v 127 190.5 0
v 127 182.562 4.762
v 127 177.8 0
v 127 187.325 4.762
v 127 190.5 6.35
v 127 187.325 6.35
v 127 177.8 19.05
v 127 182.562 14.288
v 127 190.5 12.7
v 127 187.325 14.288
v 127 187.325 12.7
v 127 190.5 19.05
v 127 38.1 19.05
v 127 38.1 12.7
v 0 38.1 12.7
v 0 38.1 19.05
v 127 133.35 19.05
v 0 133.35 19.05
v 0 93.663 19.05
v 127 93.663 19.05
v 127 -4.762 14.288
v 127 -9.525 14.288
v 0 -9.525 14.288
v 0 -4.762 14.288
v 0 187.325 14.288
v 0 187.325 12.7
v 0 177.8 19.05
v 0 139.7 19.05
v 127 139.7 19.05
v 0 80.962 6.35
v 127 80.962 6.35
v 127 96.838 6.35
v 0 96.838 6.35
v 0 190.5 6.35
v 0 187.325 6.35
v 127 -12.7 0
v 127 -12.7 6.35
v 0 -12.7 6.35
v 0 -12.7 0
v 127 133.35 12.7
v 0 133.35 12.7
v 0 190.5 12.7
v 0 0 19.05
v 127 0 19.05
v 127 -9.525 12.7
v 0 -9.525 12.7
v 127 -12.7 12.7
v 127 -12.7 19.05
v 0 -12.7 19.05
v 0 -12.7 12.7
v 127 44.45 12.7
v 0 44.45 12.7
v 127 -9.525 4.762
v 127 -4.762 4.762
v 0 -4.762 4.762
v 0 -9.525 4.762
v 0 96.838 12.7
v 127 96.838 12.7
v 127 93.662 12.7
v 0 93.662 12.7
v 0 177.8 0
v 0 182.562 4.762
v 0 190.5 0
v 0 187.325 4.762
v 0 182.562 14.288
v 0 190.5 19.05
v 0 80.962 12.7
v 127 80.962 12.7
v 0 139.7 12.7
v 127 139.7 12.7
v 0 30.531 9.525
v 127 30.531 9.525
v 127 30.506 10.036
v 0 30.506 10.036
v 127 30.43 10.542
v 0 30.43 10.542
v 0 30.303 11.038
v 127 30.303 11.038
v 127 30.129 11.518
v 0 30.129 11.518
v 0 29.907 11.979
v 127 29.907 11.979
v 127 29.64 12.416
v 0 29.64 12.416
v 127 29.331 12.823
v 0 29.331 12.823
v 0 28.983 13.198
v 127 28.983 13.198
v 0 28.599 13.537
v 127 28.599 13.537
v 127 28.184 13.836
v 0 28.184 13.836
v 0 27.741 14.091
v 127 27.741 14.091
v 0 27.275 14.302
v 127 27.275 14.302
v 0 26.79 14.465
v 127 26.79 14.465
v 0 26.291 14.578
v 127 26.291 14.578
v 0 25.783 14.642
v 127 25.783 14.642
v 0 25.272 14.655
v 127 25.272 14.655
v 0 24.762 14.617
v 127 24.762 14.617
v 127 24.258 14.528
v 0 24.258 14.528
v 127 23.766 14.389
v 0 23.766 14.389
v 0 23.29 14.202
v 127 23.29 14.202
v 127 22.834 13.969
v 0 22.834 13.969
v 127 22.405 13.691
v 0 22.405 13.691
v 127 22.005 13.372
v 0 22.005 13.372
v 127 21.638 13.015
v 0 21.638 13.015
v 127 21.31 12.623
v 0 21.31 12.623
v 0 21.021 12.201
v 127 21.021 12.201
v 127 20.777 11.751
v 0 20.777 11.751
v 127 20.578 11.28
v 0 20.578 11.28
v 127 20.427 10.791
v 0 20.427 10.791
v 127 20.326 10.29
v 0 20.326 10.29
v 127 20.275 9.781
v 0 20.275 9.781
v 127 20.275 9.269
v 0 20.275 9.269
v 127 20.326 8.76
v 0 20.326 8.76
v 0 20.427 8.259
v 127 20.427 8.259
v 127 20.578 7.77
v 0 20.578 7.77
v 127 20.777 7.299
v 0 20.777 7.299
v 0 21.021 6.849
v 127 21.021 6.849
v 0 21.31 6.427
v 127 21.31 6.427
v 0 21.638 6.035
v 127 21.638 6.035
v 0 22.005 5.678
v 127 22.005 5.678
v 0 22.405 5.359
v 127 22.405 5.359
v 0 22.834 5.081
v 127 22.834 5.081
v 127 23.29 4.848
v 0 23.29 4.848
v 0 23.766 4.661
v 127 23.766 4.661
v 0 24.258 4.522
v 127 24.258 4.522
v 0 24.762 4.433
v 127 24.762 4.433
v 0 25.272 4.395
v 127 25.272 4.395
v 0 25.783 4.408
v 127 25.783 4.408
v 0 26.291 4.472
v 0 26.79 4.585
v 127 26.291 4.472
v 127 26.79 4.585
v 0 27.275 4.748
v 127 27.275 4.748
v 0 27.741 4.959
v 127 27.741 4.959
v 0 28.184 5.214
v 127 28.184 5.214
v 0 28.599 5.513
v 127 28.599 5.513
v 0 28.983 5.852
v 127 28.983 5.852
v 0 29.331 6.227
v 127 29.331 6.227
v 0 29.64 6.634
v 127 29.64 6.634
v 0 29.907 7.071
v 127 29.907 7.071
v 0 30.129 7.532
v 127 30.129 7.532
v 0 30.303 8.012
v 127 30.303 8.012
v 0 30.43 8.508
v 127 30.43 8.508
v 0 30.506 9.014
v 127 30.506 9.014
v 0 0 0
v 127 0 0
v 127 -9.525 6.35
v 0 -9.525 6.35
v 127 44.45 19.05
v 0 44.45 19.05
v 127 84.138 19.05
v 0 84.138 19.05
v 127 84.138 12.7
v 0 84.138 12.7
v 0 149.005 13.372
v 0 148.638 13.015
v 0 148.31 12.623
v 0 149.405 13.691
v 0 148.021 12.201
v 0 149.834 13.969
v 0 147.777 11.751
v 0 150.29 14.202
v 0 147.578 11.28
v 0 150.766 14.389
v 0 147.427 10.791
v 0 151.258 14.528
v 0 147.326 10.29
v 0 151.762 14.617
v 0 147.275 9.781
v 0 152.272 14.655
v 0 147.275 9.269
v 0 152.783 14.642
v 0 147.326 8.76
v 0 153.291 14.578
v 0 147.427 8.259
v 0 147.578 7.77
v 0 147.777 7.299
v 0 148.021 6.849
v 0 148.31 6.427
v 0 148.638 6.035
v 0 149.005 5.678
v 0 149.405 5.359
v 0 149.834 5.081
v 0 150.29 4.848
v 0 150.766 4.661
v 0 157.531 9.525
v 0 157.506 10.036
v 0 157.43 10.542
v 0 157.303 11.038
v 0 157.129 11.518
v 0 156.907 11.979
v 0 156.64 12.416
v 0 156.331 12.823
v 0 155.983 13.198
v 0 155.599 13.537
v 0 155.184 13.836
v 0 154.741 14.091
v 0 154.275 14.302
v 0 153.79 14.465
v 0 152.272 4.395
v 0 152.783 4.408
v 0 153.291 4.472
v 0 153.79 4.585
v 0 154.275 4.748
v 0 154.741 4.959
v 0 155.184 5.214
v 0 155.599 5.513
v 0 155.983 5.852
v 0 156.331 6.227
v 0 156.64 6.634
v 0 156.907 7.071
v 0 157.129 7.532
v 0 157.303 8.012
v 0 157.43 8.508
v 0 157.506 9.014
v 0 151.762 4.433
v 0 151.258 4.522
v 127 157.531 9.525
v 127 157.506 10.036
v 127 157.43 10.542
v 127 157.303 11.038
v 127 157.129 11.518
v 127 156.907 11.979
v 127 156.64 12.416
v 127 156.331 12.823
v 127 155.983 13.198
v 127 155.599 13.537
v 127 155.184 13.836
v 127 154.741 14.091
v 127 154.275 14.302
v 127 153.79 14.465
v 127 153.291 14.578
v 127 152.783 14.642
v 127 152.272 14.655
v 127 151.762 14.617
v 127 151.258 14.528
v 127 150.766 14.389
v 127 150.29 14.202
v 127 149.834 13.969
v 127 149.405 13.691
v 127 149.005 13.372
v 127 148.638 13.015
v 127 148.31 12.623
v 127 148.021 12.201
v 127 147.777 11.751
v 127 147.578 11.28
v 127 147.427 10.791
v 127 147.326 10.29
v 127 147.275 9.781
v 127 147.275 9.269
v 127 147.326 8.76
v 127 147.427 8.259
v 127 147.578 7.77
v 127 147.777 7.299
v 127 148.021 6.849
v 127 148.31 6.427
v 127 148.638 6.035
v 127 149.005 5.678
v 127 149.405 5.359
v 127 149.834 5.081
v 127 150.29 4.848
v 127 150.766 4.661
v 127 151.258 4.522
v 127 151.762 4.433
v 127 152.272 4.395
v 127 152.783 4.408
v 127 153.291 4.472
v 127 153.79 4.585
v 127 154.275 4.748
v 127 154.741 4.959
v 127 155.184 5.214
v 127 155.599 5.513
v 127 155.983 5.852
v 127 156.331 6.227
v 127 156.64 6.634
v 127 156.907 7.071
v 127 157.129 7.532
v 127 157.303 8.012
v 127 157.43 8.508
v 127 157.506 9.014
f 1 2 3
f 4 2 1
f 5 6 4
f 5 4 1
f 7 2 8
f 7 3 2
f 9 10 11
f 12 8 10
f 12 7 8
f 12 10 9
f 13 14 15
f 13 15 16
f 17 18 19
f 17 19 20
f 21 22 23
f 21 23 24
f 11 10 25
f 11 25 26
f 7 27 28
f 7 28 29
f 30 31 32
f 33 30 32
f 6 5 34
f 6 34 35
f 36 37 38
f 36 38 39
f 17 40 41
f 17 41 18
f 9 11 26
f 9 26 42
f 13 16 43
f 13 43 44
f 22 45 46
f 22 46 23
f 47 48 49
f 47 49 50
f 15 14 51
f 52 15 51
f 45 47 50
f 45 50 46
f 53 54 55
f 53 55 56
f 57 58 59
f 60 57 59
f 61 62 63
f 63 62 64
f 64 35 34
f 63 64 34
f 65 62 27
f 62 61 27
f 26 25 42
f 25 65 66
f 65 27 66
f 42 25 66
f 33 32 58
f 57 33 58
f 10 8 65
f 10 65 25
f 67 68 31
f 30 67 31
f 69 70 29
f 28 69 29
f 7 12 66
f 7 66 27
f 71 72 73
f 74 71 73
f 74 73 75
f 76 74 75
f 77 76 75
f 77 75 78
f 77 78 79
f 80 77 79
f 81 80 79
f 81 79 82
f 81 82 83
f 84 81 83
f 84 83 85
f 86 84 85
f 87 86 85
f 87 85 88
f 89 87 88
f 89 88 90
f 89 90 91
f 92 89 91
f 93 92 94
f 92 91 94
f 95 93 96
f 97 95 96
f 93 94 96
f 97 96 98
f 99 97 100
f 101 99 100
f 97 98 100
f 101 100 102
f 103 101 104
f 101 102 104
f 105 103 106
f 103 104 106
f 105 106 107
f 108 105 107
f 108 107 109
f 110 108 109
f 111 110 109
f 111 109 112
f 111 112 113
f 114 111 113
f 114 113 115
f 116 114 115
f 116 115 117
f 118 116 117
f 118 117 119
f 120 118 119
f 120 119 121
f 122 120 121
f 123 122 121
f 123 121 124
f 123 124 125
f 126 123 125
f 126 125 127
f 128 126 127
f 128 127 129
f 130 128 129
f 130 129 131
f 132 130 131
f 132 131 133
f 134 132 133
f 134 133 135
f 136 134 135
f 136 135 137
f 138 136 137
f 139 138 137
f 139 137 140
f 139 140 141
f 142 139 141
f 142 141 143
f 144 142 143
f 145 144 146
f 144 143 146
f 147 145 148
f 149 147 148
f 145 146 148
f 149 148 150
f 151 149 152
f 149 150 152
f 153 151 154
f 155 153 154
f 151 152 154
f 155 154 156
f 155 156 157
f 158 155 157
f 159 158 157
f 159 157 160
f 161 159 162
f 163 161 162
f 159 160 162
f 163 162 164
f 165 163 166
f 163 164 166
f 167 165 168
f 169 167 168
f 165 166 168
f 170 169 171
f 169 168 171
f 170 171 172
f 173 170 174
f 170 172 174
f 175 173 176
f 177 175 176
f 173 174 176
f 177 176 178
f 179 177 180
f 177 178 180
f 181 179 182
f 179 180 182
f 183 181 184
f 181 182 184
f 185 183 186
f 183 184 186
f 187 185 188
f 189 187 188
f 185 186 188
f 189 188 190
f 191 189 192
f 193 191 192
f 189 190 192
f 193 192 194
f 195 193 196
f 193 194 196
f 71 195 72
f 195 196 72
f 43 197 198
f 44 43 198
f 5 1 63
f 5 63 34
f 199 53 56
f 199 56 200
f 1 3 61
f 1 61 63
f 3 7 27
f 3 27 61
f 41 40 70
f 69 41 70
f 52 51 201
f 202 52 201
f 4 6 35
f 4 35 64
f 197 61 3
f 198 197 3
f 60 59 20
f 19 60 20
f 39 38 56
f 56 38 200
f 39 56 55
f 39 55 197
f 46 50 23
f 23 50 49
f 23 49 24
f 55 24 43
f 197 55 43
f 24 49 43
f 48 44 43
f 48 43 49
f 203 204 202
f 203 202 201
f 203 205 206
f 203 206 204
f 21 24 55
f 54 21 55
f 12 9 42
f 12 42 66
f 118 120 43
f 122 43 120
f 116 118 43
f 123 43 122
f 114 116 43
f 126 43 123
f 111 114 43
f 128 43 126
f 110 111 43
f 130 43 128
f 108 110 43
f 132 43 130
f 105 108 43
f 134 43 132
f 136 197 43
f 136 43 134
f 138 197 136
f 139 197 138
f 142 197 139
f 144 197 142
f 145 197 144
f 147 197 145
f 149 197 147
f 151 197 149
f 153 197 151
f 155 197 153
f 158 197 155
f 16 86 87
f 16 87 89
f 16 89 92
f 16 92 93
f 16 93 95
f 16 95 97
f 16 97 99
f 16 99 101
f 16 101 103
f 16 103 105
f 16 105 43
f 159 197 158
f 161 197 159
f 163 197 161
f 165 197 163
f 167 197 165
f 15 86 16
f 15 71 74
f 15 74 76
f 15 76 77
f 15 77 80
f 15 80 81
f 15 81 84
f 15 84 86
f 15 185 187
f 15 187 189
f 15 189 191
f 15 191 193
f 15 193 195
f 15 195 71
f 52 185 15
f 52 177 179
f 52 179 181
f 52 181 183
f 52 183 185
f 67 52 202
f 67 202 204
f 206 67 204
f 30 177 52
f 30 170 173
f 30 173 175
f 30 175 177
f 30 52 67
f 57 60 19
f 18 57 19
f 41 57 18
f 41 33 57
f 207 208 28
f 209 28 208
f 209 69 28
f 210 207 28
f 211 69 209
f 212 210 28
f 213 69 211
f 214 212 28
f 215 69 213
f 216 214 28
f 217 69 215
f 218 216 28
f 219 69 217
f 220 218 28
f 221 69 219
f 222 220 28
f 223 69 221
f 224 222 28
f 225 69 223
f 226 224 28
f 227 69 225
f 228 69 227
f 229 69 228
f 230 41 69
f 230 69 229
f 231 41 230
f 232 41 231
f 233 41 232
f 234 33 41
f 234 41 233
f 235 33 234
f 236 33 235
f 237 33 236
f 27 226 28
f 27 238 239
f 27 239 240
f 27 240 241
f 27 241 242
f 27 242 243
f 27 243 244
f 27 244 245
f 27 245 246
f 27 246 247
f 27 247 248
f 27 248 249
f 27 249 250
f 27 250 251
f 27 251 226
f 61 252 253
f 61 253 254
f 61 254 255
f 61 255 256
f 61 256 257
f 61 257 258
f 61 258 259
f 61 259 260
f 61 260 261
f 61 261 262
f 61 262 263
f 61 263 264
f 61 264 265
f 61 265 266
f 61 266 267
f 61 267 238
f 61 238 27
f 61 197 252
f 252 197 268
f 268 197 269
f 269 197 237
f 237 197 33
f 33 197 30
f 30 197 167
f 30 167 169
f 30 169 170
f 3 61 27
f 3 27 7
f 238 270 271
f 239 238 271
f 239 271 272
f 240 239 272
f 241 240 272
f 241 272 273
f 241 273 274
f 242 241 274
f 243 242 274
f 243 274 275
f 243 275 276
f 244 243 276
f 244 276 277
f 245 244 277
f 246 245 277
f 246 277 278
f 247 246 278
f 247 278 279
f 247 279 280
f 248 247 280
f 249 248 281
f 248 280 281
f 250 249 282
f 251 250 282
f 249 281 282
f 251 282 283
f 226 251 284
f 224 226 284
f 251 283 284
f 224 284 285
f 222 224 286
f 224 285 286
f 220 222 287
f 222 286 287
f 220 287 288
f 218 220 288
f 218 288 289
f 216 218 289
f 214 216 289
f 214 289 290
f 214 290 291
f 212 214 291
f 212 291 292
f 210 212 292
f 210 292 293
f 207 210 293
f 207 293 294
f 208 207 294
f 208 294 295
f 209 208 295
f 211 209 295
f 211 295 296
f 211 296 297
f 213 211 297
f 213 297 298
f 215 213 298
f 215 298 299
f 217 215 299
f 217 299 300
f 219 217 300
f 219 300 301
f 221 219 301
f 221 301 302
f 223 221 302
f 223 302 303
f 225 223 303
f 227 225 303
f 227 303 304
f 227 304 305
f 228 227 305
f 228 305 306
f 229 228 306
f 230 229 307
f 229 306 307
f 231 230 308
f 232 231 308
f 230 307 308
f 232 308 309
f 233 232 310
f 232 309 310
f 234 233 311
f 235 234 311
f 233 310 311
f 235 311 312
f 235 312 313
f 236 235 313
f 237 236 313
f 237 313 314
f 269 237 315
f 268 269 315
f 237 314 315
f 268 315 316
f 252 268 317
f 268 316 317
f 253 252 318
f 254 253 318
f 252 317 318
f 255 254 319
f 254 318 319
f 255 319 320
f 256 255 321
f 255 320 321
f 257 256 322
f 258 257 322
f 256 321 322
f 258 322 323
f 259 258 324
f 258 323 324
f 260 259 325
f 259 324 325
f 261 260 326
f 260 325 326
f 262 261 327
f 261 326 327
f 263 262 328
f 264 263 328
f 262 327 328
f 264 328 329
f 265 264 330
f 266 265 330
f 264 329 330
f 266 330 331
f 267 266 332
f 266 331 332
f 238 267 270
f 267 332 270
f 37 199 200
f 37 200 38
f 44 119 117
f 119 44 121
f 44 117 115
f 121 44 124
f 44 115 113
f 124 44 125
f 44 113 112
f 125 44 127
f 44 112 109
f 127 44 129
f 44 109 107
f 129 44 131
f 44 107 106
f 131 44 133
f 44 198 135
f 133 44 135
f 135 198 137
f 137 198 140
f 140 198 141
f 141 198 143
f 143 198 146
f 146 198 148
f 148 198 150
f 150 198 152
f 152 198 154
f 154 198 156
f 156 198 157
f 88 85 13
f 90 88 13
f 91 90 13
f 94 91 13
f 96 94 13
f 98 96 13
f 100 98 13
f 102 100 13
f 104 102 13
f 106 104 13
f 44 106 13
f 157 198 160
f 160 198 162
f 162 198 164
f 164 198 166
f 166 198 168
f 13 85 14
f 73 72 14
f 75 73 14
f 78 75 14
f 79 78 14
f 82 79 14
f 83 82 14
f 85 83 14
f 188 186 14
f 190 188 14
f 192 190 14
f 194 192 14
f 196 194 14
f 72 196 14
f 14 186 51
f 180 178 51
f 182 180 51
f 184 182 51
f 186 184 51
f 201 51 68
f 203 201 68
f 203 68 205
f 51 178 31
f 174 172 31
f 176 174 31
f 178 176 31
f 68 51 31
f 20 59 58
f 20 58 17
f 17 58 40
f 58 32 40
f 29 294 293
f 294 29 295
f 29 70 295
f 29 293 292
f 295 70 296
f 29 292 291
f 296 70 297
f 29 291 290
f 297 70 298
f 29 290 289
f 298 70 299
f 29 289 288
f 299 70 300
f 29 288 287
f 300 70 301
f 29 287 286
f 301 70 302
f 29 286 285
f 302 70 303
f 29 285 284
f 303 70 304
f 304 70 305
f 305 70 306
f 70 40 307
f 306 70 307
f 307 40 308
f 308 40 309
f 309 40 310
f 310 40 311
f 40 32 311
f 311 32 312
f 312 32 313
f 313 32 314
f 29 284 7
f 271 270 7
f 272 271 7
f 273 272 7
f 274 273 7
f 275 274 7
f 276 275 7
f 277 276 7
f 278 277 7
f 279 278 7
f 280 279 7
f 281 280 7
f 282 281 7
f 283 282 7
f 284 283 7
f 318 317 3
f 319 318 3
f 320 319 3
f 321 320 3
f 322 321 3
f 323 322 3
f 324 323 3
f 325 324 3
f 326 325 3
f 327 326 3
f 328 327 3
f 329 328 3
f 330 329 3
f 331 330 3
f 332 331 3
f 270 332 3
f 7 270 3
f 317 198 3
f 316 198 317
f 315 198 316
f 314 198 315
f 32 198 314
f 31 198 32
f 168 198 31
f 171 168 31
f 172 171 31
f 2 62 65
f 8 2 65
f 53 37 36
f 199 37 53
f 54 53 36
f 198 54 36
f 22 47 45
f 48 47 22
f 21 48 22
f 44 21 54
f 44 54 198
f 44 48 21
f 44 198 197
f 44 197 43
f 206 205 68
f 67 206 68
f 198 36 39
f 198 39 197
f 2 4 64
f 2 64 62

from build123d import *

# Parameters (mm, degrees)
F0_W     = 127
F0_H     = 177.8
F1_DEPTH = 19.05
F2_W     = 6.35
F2_H     = 6.35
F2_W_2   = 9.525
F2_R     = 5.1314415813
F3_DEPTH = 127.001
F5_DEPTH = 127


# Not quite as in the source:
# - a feature names something its author has since deleted; it is built from what else it names


with BuildPart() as f1:
    # F0 (on Top) → F1 (new body)
    with BuildSketch(Plane.XY):
        with Locations((63.5, 88.9)):
            Rectangle(F0_W, F0_H)
    extrude(amount=F1_DEPTH)

    # F2 (on face) → F3 (cut, through all)
    with BuildSketch(Plane.YZ.offset(127)):
        with Locations((41.275, 15.875)):
            Rectangle(F2_W, F2_H)
        with Locations((88.9, 15.875)):
            Rectangle(F2_W_2, F2_H)
        Polygon((93.6625, 12.7), (84.1375, 12.7), (80.9625, 12.7), (80.9625, 6.35), (96.8375, 6.35), (96.8375, 12.7), align=None)
        with Locations((25.4, 9.525)):
            Circle(F2_R)
        with Locations((152.4, 9.525)):
            Circle(F2_R)
        with Locations((136.525, 15.875)):
            Rectangle(F2_W, F2_H)
    extrude(amount=-F3_DEPTH, mode=Mode.SUBTRACT)


with BuildPart() as f5:
    # F4 (on face) → F5 (new body, through all)
    with BuildSketch(Plane.YZ.offset(127)):
        Polygon((0, 0), (0, 19.05), (-12.7, 19.05), (-12.7, 12.7), (-9.525, 12.7), (-9.525, 14.2875), (-4.7625, 14.2875), (-4.7625, 4.7625), (-9.525, 4.7625), (-9.525, 6.35), (-12.7, 6.35), (-12.7, 0), align=None)
    extrude(amount=-F5_DEPTH)


with BuildPart() as f5b:
    # F4 (on face) → F5, piece 2 (new body, through all)
    with BuildSketch(Plane.YZ.offset(127)):
        Polygon((177.8, 19.05), (177.8, 0), (190.5, 0), (190.5, 6.35), (187.325, 6.35), (187.325, 4.7625), (182.5625, 4.7625), (182.5625, 14.2875), (187.325, 14.2875), (187.325, 12.7), (190.5, 12.7), (190.5, 19.05), align=None)
    extrude(amount=-F5_DEPTH)


solid = Compound([f1.part, f5.part, f5b.part])
